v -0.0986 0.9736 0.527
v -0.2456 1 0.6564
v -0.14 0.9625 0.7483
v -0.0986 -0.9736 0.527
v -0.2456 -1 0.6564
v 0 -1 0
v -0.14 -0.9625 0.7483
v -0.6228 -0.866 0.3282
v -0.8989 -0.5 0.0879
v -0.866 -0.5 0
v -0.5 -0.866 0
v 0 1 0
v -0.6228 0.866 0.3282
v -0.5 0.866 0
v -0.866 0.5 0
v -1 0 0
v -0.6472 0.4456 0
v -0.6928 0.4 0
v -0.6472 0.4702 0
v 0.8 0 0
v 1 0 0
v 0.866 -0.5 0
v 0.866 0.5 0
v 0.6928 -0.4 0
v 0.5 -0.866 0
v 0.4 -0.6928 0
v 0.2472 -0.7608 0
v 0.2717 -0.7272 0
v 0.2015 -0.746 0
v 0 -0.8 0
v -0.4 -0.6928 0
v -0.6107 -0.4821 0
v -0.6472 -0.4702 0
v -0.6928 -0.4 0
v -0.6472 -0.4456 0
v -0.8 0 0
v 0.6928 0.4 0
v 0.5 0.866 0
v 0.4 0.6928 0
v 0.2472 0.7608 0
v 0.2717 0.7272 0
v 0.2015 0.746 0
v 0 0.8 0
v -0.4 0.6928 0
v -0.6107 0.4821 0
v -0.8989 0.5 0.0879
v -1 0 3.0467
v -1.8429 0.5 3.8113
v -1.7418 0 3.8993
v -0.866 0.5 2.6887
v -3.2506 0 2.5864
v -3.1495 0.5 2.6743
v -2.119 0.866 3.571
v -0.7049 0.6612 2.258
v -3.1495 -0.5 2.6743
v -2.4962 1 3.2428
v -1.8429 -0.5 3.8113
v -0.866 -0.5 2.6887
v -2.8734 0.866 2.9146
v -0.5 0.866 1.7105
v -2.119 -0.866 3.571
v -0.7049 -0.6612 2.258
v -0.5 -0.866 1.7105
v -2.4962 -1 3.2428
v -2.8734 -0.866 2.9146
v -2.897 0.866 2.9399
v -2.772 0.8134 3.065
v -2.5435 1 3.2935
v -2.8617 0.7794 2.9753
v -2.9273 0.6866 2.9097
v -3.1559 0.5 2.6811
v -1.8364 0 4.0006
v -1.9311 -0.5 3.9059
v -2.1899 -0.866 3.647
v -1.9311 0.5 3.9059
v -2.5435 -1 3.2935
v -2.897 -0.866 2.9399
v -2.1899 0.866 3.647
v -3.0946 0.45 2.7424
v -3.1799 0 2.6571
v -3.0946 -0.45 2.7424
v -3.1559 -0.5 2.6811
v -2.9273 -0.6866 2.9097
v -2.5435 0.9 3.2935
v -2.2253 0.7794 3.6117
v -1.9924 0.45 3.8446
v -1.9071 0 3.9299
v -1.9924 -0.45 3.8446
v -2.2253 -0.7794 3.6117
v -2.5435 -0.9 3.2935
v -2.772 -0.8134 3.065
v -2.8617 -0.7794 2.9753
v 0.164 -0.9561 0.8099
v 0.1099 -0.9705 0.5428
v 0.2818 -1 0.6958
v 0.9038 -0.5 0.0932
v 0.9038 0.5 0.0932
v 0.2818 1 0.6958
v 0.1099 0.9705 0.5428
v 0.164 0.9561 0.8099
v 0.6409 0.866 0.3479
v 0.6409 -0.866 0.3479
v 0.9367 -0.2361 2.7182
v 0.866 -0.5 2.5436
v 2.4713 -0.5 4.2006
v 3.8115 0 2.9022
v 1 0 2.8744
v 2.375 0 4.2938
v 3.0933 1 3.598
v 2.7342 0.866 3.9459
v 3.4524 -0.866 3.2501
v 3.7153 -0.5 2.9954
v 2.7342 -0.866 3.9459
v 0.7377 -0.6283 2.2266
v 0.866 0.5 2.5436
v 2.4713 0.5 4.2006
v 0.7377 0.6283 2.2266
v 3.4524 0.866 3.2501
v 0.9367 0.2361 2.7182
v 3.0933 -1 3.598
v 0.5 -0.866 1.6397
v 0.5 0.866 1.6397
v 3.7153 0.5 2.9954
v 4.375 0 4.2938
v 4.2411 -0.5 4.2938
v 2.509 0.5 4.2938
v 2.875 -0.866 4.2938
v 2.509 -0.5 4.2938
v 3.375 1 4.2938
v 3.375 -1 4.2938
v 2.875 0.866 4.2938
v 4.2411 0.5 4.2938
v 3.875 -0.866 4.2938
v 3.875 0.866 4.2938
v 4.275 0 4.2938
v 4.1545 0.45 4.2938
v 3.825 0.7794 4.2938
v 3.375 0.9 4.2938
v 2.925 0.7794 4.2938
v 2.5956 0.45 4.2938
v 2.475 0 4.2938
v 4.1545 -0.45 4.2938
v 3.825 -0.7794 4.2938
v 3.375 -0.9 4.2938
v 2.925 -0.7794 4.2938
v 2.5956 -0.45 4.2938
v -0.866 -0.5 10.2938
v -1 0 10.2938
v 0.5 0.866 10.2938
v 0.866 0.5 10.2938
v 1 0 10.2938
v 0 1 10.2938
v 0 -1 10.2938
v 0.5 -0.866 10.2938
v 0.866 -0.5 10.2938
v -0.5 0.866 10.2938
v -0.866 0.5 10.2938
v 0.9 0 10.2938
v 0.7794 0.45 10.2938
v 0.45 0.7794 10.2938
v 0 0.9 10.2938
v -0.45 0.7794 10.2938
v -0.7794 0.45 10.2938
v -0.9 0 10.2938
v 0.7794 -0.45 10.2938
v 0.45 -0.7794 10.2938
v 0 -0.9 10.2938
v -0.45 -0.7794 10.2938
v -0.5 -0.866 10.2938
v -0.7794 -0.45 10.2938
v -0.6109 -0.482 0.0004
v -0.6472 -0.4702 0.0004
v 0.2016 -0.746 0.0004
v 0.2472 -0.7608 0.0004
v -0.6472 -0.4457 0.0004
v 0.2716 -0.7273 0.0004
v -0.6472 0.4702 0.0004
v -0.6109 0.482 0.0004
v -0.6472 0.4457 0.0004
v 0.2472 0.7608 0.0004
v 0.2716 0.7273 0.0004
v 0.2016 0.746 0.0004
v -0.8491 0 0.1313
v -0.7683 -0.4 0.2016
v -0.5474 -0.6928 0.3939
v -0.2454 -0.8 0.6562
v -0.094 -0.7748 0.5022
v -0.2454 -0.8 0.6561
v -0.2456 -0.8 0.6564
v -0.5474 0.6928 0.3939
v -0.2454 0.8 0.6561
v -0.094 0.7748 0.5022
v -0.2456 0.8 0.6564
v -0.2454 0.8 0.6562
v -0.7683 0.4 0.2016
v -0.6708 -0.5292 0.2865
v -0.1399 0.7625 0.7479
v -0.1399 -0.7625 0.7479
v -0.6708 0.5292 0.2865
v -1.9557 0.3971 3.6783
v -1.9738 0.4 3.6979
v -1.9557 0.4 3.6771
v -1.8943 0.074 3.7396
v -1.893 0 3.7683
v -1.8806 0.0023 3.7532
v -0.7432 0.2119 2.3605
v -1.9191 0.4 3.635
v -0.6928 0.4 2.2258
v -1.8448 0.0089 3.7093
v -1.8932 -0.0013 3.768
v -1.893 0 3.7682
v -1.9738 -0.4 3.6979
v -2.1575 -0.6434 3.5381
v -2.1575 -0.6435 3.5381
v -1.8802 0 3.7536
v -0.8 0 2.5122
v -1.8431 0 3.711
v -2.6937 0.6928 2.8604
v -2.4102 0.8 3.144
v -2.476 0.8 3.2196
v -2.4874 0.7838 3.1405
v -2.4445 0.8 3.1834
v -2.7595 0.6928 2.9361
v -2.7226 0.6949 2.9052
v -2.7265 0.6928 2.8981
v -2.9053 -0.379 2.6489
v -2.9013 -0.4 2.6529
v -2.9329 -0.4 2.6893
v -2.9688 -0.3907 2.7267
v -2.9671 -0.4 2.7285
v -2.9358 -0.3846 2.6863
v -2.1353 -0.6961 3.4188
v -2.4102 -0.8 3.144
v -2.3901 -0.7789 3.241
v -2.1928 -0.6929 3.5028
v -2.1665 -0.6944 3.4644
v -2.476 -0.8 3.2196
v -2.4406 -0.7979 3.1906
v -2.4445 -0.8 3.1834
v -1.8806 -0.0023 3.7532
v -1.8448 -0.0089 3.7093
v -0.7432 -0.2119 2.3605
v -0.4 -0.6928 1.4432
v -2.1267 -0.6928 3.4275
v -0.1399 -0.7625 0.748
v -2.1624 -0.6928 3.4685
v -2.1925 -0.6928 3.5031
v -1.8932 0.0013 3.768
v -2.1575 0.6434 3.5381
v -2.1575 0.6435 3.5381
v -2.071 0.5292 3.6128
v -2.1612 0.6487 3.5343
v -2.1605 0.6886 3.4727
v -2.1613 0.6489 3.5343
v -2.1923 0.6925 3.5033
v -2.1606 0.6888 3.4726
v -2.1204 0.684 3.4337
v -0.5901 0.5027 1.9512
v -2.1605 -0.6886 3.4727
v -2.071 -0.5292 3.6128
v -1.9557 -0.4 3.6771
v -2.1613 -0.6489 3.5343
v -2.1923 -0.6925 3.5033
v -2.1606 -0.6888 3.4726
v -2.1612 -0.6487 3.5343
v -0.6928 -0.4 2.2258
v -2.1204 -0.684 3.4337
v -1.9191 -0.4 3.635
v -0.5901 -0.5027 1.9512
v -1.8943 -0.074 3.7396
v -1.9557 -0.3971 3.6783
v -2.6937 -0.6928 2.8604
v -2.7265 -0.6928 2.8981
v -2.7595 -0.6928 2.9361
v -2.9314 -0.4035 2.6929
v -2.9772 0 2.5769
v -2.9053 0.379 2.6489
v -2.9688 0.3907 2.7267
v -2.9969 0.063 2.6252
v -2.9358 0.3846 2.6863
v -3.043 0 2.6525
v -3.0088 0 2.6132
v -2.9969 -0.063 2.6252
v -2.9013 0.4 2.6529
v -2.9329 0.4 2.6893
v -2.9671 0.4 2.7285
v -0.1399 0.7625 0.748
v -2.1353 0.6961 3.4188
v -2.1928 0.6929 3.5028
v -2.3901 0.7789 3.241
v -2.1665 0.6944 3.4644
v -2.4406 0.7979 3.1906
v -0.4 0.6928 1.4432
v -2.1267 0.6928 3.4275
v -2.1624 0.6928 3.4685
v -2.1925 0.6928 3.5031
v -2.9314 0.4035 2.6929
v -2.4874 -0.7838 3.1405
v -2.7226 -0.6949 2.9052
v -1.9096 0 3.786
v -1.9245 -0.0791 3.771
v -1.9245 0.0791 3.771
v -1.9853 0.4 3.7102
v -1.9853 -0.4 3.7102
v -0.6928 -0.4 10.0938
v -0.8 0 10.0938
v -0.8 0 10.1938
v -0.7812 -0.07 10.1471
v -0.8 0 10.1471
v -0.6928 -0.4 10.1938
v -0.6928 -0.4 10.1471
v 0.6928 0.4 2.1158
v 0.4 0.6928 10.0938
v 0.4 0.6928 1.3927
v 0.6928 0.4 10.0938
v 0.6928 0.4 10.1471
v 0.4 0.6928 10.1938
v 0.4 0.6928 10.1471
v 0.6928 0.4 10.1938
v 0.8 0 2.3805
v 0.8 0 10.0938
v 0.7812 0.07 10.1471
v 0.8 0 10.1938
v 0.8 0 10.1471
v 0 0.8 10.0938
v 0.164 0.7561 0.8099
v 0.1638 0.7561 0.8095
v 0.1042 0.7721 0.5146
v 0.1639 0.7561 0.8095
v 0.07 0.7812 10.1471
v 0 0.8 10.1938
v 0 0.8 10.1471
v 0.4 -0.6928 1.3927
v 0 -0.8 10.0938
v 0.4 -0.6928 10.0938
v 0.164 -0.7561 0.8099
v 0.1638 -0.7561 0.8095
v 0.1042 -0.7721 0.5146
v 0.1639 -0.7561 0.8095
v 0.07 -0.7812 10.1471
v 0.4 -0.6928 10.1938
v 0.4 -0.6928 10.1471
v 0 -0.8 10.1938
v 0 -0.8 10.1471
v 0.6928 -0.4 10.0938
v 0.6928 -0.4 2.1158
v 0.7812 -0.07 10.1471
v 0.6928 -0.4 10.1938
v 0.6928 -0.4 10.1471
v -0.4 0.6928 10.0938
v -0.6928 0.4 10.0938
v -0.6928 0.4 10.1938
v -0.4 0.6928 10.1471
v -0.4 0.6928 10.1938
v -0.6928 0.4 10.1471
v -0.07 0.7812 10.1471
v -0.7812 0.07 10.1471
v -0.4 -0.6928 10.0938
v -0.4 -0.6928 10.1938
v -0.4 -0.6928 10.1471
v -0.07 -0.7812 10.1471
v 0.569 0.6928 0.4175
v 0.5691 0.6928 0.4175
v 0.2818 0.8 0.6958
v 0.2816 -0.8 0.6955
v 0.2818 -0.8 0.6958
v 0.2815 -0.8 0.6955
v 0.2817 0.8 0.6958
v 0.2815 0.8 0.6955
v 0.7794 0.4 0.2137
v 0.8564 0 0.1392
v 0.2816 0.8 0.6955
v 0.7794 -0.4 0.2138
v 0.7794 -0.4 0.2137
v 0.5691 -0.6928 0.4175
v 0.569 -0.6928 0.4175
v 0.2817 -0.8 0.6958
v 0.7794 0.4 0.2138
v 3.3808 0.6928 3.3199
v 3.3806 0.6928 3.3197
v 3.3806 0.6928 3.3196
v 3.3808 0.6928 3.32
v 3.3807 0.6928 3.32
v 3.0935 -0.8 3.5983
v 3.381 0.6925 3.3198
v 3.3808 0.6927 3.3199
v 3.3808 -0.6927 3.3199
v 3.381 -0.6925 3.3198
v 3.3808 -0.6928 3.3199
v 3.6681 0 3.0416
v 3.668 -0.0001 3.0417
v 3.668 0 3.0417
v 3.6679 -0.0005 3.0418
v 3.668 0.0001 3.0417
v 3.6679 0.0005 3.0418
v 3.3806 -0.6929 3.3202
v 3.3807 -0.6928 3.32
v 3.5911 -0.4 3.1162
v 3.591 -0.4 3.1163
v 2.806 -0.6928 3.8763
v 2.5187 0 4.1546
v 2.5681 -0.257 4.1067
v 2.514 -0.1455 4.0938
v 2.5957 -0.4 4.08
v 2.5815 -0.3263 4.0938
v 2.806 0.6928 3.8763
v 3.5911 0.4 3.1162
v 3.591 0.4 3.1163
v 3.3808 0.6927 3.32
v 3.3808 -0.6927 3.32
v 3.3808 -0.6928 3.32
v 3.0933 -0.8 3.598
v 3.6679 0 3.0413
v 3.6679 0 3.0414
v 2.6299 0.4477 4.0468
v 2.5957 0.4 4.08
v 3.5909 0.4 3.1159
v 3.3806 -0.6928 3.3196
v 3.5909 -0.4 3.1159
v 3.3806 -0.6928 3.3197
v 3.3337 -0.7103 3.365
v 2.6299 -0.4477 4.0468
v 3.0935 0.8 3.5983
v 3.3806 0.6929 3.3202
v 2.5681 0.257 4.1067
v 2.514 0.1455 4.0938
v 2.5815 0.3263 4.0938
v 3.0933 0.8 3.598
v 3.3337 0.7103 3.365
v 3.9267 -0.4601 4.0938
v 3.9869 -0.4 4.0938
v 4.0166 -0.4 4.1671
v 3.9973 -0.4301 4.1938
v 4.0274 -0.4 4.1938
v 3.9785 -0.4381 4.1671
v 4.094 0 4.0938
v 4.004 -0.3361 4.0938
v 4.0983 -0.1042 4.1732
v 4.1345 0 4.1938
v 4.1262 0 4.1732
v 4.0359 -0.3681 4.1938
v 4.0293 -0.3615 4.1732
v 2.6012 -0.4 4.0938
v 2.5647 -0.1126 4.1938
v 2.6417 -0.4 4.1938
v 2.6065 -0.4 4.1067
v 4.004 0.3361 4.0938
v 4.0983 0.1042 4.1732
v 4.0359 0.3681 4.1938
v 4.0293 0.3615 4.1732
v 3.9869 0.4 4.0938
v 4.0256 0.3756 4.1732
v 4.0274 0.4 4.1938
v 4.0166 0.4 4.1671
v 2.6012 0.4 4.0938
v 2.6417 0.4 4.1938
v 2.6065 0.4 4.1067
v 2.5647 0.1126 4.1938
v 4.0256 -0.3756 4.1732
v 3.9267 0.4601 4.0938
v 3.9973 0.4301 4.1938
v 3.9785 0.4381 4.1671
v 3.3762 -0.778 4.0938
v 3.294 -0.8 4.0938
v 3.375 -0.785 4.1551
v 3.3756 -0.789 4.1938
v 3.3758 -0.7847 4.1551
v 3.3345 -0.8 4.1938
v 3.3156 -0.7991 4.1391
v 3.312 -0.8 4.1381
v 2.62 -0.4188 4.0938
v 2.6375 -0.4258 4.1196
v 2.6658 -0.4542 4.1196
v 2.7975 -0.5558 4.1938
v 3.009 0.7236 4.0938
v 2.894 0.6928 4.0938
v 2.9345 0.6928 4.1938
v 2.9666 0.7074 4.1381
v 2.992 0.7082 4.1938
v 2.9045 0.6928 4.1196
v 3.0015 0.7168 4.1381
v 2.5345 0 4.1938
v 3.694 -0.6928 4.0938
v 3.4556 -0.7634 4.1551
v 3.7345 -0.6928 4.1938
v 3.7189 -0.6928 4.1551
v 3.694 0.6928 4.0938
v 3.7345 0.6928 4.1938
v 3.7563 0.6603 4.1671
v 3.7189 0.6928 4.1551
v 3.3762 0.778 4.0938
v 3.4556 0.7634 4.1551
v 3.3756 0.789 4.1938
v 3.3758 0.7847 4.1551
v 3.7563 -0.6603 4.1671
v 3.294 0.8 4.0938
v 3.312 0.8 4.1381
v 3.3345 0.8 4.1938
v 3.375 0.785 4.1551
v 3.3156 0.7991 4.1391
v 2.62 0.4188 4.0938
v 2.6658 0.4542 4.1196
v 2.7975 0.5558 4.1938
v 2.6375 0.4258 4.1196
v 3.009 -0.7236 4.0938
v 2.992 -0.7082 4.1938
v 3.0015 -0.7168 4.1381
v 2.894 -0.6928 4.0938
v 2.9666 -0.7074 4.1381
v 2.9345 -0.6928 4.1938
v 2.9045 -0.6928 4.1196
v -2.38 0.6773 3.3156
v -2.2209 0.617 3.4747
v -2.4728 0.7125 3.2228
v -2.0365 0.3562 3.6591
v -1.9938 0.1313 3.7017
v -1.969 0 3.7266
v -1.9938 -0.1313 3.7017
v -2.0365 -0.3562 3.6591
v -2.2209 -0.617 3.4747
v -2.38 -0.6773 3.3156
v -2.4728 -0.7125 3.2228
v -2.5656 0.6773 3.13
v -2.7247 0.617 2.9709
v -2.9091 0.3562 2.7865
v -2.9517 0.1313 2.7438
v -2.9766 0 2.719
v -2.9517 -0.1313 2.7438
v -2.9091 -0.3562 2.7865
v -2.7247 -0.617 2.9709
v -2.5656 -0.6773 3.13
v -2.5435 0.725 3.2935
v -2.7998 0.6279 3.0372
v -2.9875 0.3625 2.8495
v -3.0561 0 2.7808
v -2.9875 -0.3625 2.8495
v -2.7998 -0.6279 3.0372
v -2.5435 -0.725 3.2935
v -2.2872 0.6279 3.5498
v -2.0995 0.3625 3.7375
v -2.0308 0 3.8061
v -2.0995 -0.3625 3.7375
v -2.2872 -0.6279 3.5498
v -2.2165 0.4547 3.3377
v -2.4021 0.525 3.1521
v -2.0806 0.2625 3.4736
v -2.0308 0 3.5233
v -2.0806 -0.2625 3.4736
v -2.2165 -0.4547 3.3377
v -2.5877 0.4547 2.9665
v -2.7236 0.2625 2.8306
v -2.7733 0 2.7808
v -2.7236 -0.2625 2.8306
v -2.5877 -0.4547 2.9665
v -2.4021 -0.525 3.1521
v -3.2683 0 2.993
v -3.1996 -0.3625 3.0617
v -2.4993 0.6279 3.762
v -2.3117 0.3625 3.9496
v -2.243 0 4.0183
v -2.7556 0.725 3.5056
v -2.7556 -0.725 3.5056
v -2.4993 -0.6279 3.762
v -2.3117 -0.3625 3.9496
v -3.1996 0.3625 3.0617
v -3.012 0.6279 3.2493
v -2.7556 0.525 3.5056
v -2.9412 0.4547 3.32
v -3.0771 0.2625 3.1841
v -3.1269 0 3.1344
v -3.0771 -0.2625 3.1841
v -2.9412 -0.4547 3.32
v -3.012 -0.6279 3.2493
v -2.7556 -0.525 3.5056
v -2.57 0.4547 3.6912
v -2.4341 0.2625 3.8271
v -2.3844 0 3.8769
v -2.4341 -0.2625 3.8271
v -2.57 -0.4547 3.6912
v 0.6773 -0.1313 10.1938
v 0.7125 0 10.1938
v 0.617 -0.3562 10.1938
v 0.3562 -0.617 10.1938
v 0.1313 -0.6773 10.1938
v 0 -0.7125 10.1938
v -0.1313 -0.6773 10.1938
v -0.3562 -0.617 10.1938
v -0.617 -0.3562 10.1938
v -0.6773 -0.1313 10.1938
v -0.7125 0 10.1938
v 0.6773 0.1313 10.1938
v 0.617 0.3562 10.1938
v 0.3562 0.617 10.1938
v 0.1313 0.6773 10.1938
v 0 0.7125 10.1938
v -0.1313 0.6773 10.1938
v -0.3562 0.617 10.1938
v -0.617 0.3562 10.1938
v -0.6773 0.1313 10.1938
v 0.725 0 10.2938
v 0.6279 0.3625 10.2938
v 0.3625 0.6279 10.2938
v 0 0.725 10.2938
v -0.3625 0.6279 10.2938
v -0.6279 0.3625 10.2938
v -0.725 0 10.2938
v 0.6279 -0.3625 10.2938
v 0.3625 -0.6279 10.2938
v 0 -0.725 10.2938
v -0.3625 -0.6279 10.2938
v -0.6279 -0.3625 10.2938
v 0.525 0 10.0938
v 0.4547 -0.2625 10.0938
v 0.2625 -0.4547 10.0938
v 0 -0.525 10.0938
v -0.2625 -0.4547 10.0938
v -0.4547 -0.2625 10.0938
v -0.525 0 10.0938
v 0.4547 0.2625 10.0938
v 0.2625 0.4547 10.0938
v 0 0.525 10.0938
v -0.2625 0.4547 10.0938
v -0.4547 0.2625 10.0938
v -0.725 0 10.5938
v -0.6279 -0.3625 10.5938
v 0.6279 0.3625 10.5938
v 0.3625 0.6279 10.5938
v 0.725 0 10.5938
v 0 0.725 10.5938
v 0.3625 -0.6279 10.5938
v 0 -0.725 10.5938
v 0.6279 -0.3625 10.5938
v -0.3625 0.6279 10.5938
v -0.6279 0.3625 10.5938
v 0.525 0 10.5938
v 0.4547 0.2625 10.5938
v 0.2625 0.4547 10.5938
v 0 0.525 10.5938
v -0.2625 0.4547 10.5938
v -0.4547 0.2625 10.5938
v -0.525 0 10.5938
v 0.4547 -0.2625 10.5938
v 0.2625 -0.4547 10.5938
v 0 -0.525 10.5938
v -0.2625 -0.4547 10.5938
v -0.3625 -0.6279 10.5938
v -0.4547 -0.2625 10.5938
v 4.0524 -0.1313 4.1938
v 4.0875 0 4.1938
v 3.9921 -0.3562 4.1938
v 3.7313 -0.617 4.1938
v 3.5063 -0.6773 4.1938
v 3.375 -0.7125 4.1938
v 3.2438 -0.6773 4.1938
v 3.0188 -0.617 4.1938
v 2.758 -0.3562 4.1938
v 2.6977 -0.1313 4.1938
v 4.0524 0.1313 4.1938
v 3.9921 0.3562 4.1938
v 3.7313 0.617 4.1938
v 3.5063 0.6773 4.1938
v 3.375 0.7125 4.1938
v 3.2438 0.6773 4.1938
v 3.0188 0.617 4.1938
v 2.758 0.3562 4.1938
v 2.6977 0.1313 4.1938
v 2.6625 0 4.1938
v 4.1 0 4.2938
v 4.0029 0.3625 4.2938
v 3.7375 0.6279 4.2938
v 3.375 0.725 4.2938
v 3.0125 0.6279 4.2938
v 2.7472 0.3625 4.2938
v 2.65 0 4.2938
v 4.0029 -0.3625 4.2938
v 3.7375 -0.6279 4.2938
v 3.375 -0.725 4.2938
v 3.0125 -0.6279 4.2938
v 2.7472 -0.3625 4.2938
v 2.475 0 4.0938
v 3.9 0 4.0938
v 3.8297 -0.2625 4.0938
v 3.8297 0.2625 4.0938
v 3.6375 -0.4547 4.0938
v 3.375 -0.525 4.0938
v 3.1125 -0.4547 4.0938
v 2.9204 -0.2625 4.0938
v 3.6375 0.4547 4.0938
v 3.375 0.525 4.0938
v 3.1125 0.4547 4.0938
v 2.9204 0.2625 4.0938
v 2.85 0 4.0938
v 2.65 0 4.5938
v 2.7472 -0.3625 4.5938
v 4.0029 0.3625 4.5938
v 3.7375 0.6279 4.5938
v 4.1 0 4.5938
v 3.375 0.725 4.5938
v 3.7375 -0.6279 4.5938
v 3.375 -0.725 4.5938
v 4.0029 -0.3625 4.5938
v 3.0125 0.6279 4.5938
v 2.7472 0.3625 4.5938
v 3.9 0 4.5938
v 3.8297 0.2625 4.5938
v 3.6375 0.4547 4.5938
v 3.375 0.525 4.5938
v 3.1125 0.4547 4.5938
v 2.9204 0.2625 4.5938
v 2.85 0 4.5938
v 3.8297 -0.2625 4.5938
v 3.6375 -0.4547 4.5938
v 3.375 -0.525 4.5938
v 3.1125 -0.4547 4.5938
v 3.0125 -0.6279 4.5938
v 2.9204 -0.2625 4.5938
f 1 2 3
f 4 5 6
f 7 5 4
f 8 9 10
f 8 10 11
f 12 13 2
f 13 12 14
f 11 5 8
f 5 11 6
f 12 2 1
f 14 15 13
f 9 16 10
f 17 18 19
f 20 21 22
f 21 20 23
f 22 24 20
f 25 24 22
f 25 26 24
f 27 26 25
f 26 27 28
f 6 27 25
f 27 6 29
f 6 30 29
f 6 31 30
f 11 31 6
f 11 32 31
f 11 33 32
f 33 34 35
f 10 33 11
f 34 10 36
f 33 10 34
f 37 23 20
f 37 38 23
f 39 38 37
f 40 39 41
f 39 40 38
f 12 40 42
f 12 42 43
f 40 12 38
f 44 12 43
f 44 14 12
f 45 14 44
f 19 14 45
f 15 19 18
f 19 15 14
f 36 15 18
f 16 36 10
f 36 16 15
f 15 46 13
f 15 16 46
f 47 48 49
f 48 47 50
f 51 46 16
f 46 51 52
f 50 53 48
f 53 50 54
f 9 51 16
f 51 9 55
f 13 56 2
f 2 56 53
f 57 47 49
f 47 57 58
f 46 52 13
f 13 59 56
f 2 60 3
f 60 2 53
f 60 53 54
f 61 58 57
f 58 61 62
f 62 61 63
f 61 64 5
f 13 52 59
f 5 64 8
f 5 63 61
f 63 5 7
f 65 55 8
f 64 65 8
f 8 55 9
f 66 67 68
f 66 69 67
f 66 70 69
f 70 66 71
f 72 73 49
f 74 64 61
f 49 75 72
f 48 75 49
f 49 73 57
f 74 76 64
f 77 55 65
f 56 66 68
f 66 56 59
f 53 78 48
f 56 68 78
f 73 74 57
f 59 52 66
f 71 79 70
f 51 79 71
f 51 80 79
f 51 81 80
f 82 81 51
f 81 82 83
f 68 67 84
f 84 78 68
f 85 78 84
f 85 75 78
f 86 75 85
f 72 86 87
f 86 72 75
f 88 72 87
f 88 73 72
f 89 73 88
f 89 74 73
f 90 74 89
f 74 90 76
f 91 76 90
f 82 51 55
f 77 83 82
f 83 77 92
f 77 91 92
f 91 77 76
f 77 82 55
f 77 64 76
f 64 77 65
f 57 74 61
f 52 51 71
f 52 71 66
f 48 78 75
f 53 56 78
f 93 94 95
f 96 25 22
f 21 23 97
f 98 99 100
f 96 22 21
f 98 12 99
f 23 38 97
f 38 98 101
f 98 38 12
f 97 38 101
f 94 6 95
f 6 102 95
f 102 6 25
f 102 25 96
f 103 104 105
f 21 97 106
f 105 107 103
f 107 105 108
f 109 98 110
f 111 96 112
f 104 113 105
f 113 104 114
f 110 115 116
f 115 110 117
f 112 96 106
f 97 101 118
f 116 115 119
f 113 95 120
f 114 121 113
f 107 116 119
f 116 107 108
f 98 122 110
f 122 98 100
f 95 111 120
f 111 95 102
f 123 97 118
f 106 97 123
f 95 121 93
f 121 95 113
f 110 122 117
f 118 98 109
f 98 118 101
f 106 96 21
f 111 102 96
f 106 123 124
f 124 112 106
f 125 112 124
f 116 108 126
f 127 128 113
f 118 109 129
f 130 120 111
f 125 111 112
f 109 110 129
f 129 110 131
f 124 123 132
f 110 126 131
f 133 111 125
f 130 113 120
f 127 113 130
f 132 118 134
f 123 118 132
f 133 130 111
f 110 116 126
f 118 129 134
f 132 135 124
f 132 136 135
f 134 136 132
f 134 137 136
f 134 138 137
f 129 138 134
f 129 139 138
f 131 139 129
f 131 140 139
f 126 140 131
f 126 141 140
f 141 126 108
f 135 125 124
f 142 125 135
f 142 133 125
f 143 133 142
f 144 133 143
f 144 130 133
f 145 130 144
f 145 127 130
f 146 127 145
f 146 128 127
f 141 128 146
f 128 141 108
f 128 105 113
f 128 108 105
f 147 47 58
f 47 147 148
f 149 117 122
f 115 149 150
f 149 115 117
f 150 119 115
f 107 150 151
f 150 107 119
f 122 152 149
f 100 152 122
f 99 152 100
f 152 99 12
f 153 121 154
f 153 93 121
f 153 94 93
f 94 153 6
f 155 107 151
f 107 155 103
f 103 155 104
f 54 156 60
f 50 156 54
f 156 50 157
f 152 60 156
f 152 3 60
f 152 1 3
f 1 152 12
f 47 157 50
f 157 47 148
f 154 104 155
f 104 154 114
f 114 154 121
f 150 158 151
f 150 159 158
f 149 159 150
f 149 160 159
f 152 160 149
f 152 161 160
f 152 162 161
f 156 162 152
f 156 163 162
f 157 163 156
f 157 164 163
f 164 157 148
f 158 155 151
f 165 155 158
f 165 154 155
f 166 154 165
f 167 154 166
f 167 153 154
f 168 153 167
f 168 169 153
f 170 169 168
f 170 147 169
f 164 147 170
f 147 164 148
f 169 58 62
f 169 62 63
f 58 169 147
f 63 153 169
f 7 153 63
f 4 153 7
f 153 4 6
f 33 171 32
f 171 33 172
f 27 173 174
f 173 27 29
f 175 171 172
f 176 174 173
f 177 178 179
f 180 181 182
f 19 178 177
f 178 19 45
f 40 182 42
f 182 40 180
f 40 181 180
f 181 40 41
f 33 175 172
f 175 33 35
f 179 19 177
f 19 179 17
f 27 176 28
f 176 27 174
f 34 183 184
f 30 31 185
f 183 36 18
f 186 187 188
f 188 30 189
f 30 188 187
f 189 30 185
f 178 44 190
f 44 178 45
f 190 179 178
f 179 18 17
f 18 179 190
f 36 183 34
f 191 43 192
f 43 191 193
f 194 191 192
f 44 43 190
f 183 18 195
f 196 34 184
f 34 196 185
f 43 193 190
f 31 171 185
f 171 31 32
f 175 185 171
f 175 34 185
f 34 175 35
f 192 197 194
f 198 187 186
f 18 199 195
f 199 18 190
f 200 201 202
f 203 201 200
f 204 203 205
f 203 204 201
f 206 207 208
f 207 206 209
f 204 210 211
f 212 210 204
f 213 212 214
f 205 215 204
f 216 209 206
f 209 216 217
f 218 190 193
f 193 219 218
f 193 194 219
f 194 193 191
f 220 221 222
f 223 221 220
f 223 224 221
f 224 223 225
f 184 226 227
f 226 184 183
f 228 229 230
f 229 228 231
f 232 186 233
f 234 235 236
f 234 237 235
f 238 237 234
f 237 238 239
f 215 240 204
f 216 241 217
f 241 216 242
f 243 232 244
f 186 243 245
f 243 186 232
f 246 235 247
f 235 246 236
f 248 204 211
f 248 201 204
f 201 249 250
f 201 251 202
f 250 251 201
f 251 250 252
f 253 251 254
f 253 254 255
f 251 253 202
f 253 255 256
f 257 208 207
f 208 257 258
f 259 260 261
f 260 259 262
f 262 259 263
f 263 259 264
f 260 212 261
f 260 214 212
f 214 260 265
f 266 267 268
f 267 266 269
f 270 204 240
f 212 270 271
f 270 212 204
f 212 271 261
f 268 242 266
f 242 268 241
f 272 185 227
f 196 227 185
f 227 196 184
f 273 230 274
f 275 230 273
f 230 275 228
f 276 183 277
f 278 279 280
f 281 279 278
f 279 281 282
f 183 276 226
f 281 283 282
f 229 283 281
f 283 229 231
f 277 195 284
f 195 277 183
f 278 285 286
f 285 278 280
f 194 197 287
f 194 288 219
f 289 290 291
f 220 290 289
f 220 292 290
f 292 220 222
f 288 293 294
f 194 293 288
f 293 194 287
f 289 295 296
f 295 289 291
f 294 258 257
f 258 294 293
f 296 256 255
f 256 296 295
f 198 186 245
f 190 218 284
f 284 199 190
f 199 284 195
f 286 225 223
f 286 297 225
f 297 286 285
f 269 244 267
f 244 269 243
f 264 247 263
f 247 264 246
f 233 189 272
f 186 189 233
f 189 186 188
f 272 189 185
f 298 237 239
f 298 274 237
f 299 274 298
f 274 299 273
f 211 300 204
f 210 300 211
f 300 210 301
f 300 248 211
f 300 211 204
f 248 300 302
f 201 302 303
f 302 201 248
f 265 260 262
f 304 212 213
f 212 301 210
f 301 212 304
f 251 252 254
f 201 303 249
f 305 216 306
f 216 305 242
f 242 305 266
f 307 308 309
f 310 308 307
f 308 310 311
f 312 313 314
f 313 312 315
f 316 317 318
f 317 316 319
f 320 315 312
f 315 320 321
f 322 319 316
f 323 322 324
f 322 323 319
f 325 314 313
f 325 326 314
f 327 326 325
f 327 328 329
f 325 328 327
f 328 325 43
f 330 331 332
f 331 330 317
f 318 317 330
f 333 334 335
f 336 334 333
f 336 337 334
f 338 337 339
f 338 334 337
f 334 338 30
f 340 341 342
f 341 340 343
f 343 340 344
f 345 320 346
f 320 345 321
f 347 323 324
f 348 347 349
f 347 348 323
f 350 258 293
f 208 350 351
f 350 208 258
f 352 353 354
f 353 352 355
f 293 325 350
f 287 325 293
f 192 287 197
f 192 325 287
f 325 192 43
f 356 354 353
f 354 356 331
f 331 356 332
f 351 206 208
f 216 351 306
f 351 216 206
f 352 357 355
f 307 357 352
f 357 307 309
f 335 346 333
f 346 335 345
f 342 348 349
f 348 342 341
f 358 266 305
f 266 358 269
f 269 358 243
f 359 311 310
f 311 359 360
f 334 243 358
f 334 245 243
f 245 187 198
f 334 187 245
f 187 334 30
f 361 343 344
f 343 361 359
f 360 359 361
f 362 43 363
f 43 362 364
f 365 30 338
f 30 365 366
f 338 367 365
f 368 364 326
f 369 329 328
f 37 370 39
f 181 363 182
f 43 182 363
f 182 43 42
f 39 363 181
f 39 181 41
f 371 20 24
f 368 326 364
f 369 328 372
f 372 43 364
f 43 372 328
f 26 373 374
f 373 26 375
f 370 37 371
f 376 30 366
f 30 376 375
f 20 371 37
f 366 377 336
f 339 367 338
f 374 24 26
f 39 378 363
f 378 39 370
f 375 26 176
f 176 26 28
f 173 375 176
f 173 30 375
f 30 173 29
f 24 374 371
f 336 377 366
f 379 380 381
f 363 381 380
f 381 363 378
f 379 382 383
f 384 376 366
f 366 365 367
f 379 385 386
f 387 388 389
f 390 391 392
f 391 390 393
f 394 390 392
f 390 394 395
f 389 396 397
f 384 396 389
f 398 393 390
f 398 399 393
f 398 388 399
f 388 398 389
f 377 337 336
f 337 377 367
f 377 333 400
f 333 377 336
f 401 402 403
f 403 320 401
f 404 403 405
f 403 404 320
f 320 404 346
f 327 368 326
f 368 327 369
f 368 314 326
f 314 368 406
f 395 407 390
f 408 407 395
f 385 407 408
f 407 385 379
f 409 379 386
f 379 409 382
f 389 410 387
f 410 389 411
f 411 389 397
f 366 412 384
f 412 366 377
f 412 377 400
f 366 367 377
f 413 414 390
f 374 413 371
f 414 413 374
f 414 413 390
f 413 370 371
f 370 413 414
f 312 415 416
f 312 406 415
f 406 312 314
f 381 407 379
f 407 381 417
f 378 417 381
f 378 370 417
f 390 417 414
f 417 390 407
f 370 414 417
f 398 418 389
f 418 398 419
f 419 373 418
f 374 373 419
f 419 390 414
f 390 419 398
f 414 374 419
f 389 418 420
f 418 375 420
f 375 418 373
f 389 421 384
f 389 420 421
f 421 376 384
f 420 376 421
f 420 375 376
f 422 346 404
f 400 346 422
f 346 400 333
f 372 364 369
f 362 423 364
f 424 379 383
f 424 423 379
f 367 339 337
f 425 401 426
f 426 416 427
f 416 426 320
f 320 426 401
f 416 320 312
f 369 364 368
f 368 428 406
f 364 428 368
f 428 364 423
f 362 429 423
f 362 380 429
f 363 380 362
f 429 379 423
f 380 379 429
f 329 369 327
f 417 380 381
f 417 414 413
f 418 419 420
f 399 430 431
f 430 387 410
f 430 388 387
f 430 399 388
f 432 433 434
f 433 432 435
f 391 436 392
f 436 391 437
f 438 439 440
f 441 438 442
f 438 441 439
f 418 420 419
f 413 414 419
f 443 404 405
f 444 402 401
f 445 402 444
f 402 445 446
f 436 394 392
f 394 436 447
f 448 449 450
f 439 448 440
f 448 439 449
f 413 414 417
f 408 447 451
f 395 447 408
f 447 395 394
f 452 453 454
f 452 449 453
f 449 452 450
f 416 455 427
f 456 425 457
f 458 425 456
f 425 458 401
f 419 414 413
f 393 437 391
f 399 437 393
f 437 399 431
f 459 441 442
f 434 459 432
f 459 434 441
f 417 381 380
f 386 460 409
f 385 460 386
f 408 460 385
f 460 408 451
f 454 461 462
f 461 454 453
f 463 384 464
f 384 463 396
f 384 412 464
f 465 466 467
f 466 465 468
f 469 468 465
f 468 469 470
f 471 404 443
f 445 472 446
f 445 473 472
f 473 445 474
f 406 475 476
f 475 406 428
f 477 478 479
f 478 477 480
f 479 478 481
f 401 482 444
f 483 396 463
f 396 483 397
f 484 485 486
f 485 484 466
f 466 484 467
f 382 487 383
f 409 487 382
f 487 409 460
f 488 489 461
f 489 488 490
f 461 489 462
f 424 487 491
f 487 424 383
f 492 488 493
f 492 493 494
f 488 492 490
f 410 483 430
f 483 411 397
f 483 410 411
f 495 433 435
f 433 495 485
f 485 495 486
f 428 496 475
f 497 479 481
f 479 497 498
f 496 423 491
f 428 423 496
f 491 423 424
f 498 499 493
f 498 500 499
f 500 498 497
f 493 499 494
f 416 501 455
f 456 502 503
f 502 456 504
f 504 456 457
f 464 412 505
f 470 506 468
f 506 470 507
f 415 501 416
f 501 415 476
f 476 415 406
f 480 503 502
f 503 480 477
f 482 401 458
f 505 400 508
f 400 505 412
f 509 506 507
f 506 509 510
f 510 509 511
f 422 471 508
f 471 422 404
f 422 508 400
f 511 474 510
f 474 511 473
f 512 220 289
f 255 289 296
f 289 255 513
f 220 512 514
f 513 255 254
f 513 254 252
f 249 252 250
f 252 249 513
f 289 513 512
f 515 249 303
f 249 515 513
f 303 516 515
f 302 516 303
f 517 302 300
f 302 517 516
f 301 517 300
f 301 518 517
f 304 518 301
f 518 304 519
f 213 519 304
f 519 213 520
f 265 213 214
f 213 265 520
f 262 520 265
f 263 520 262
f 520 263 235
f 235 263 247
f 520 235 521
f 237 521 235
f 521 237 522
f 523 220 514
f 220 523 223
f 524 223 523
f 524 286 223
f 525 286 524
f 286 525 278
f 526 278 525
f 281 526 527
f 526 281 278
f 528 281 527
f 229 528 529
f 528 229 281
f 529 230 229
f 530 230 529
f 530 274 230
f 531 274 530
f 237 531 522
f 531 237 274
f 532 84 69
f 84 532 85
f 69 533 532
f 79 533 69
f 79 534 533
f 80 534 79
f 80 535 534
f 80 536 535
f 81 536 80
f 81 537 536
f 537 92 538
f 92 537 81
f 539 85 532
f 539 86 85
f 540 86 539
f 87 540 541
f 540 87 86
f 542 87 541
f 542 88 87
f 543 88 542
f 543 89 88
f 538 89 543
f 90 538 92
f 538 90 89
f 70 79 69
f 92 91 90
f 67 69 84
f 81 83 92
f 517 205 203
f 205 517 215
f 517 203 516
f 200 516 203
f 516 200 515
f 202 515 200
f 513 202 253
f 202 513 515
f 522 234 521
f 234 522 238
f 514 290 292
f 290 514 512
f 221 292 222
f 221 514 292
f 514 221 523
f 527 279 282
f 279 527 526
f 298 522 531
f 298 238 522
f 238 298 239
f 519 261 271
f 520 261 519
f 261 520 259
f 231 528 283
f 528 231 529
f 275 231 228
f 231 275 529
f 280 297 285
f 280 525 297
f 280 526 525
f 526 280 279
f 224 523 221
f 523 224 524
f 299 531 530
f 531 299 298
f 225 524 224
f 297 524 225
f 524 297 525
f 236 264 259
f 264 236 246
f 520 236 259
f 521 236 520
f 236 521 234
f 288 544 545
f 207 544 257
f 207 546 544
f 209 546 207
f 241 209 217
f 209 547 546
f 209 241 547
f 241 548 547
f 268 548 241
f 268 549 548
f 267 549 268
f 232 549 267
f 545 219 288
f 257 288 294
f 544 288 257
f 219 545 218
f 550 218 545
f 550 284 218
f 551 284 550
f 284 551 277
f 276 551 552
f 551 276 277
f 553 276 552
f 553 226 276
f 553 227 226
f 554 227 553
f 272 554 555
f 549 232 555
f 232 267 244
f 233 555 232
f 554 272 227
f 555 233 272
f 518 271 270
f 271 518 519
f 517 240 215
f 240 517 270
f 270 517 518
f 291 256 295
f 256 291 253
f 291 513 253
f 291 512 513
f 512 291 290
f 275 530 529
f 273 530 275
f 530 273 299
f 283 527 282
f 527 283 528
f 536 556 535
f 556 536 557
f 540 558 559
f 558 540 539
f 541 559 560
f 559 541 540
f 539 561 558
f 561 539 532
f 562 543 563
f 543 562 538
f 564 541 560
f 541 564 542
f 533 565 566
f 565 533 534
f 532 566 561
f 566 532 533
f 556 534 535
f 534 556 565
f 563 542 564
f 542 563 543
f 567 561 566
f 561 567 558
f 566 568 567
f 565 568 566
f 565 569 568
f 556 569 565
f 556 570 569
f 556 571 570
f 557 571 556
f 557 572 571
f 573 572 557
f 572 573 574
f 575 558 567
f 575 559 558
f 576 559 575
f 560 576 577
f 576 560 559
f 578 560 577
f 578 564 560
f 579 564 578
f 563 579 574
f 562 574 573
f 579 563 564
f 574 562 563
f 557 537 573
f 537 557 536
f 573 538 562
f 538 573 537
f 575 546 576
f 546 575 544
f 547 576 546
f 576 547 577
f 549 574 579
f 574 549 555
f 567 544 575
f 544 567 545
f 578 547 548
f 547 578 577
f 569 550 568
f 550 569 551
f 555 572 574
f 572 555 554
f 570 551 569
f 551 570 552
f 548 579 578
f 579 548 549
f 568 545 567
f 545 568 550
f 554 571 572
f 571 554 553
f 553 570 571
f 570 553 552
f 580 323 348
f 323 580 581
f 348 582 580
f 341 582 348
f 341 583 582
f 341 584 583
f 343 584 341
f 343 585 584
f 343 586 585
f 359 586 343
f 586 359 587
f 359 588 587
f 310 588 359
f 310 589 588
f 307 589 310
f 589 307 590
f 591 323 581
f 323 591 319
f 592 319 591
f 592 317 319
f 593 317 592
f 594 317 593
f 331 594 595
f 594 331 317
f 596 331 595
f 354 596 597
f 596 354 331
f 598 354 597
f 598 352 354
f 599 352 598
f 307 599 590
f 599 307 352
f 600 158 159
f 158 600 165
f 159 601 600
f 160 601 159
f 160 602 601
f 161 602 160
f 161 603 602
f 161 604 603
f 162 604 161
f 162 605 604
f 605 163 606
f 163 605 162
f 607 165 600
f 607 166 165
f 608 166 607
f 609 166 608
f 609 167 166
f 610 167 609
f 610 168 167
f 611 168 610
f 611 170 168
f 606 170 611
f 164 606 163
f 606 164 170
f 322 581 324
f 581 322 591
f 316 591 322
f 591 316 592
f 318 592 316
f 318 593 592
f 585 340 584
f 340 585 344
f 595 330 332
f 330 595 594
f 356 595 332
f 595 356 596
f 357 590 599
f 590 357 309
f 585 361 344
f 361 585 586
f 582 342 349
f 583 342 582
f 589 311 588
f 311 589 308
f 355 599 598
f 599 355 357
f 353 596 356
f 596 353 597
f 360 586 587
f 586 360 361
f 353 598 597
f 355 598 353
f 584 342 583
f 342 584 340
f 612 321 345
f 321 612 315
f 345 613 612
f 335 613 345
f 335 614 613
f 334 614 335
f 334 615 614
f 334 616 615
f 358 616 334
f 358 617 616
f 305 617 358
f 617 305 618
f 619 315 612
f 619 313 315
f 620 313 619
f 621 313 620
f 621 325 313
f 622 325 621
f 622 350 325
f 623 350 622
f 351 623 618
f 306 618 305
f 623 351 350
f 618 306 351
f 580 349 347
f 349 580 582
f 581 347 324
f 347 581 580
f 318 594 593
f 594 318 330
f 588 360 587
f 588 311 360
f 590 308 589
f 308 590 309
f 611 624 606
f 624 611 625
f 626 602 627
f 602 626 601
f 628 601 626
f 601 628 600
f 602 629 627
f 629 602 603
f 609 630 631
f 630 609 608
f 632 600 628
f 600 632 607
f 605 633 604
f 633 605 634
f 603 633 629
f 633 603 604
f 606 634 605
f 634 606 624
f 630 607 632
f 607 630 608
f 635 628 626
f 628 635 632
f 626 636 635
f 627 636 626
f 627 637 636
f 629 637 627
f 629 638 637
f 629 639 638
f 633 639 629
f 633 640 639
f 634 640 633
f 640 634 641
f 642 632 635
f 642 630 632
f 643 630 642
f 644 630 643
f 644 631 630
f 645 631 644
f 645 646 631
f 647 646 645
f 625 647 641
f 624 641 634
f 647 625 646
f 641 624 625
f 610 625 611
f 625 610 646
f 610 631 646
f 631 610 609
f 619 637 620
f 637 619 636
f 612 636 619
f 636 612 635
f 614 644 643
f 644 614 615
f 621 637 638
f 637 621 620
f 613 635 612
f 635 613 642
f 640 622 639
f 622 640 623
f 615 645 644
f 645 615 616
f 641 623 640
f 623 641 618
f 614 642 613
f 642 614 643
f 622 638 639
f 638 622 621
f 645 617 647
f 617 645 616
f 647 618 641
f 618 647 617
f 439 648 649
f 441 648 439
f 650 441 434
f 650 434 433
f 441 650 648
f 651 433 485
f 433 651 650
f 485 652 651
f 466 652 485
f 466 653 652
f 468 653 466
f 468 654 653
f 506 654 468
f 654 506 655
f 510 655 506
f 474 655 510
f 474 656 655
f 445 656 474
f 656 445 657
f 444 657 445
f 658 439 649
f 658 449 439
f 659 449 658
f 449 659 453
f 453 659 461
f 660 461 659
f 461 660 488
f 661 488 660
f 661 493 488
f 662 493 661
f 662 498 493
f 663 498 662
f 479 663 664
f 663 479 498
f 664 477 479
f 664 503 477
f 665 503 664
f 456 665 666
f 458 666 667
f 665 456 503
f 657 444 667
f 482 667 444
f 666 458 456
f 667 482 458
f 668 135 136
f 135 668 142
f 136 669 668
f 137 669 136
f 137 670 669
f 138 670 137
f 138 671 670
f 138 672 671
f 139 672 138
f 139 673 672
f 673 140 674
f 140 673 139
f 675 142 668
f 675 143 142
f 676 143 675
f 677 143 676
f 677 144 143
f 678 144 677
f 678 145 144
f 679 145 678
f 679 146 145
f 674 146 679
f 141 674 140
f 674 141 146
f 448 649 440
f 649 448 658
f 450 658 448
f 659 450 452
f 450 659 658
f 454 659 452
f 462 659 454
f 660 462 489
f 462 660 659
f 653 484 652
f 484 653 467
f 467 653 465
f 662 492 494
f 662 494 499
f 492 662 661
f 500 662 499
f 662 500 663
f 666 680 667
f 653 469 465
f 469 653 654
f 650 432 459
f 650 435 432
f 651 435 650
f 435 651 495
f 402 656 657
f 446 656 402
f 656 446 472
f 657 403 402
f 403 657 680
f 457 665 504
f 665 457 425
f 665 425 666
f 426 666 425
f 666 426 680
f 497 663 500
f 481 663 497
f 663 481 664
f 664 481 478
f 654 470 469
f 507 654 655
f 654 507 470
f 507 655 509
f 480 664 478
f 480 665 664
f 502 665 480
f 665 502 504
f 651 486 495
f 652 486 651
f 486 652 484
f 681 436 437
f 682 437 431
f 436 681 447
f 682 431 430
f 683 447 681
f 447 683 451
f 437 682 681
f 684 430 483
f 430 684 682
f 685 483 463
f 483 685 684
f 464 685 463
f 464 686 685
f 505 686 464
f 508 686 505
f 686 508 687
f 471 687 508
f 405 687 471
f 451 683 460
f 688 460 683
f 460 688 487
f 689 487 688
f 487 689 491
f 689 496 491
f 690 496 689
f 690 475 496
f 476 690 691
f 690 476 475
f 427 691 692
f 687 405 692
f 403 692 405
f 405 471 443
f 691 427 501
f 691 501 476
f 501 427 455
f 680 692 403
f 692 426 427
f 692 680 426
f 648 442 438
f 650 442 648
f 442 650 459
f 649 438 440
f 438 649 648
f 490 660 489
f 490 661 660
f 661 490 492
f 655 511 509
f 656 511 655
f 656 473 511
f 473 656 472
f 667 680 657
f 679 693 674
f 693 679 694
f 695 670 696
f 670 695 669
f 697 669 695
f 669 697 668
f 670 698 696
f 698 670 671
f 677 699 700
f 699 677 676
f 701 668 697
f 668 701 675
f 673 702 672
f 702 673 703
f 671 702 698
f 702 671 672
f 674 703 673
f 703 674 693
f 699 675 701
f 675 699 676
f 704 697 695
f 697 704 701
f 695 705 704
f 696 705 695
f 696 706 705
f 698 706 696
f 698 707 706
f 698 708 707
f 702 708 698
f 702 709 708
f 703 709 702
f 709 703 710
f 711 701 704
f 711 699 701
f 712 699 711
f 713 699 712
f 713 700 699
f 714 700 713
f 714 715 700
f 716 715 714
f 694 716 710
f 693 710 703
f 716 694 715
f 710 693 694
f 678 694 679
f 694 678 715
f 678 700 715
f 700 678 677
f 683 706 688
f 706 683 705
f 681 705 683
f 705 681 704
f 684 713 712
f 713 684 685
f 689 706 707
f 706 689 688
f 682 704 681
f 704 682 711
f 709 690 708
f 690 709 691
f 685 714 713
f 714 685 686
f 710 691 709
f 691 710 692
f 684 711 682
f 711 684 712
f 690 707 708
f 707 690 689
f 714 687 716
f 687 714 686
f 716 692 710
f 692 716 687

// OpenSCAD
tolerance=0.075;
hole_radius=0.075;
grid_hole_radius=0.075;
outer_radius=1;
thickness=0.2;
hole_attach_height=0.075;
attach_thickness=0.1;

//parameters that don't have to be defined explicitly
eps = tolerance/100;
inner_radius = outer_radius - thickness;
fn = 12;
fnh = 6;

module angled_cylinder(angle_deg_y, _h, _r, angle_deg_x = 0) {
    rotate([angle_deg_x, angle_deg_y, 0]) { // Rotate the cylinder 
            cylinder(h = _h, r = _r, center = true, $fn = fnh);
        }
}

module hole(_h) {
    cylinder(h = _h, r = grid_hole_radius, $fn = fnh);
}

//makes circle of holes
module circular_grid(_h, _r, _n) {
    for (i = [0:_n-1]) {
        angle = i * 360 / _n;
        x_pos = _r * cos(angle);
        y_pos = _r * sin(angle);
        translate([x_pos, y_pos, -eps]) {
            hole(_h);
        }
    }
}

//makes grid of holes
module hole_grid(hole_height, grid_h) {
    translate([0,0,hole_height]) {
        difference() {
            //cylinder
            cylinder(h = grid_h, r = (inner_radius + outer_radius)/2, 
                center=false, $fn = fn);
            //holes
            for (i = [0 : grid_hole_radius * 2 + hole_attach_height : inner_radius - grid_hole_radius * 2]) {
                circular_grid(grid_h + eps*2, i, ceil(6.28*i/(grid_hole_radius*4)));
            }
            
        } 
    }
}

//makes curve of CSC
module curve(_radius, _twist, _turning_angle, _turning_radius) {
    rotate([90,0,_twist])
    translate([-_turning_radius, 0, 0])
    rotate_extrude(angle=_turning_angle, convexity=100, $fn = fn)
    translate([_turning_radius, 0]) circle(_radius);
}

module CSC(_r, _t1, _ta1, _tr1, _h, _t2, _ta2, _tr2, is_inner) {
    
    if (_ta1 > 90) {
        CSC(_r, _t1, 90, _tr1, 0, 0, 0, 0, is_inner);
        
        pos1 = (-_tr1 + sqrt(_tr1*_tr1 - pow(_tr1,2)));
        translate([pos1*cos(_t1),pos1*sin(_t1),_tr1])
        rotate([0,-90,_t1])
        CSC(_r, 0, _ta1 - 90, _tr1, _h, _t2, _ta2, _tr2, is_inner);
    } else if (_ta2 > 90) {
        CSC(_r, _t1, _ta1, _tr1, _h, _t2, 90, _tr2, is_inner);
        
        pos1 = (-_tr1 + sqrt(_tr1*_tr1 - pow(_tr1*sin(_ta1),2)));
        pos2 = (-_tr2 + sqrt(_tr2*_tr2 - pow(_tr2,2)));
        translate([pos1*cos(_t1),pos1*sin(_t1),_tr1*sin(_ta1)])
        rotate([0,-_ta1,_t1])
        translate([0, 0, _h])
        translate([pos2*cos(_t2),pos2*sin(_t2),_tr2])
        rotate([0,-90,_t2])
        CSC(_r, 0, 0, 0, 0, 0, _ta2 - 90, _tr2, is_inner);
    } else {
        //intermediate positions
        pos1 = (-_tr1 + sqrt(_tr1*_tr1 - pow(_tr1*sin(_ta1),2)));
        pos2 = (-_tr2 + sqrt(_tr2*_tr2 - pow(_tr2*sin(_ta2),2)));
        
        union() {
            //bottom shell threshold
            if (is_inner) {
                cylinder(h=eps, r=_r, center=true);
            }
            
            //first curve of CSC
            curve(_r, _t1, _ta1, _tr1);
            
            //straight link of CSC
            translate([pos1*cos(_t1),pos1*sin(_t1),_tr1*sin(_ta1)])
            rotate([0,-_ta1,_t1])
            if (is_inner) {
                //add threshold for shelling
                translate([0,0,-eps /2])
                cylinder(h=_h + eps,r=_r, center = false, $fn= fn);
            } else {
                cylinder(h=_h,r=_r, center = false, $fn= fn);
            }
            
            //second curve of CSC
            translate([pos1*cos(_t1),pos1*sin(_t1),_tr1*sin(_ta1)])
            rotate([0,-_ta1,_t1])
            translate([0, 0, _h])
            curve(_r, _t2, _ta2, _tr2);
            
            //shelling thresholds
            if (is_inner) {
                translate([pos1*cos(_t1),pos1*sin(_t1),_tr1*sin(_ta1)])
                rotate([0,-_ta1,_t1])
                translate([0, 0, _h])
                translate([pos2*cos(_t2),pos2*sin(_t2),_tr2*sin(_ta2)])
                rotate([0,-_ta2,_t2]) {
                    cylinder(h=eps, r=_r, center=true,$fn=fn);
                }
            
            }
        }
    }
    
}

//allow modules to attach
module CSC_ATTACH(_r, _t1, _ta1, _tr1, _h, _t2, _ta2, _tr2, next_hole_radius, next_hole_attach_height, next_inner) {
    
    if (_ta1 > 90) {        
        pos1 = (-_tr1 + sqrt(_tr1*_tr1 - pow(_tr1,2)));
        translate([pos1*cos(_t1),pos1*sin(_t1),_tr1])
        rotate([0,-90,_t1])
        CSC_ATTACH(_r, 0, _ta1 - 90, _tr1, _h, _t2, _ta2, _tr2, next_hole_radius, next_hole_attach_height, next_inner);
    } else if (_ta2 > 90) {        
        pos1 = (-_tr1 + sqrt(_tr1*_tr1 - pow(_tr1*sin(_ta1),2)));
        pos2 = (-_tr2 + sqrt(_tr2*_tr2 - pow(_tr2,2)));
        translate([pos1*cos(_t1),pos1*sin(_t1),_tr1*sin(_ta1)])
        rotate([0,-_ta1,_t1])
        translate([0, 0, _h])
        translate([pos2*cos(_t2),pos2*sin(_t2),_tr2])
        rotate([0,-90,_t2])
        CSC_ATTACH(_r, 0, 0, 0, 0, 0, _ta2 - 90, _tr2, next_hole_radius, next_hole_attach_height, next_inner);
    } else {
        //intermediate positions
        pos1 = (-_tr1 + sqrt(_tr1*_tr1 - pow(_tr1*sin(_ta1),2)));
        pos2 = (-_tr2 + sqrt(_tr2*_tr2 - pow(_tr2*sin(_ta2),2)));
        
        translate([pos1*cos(_t1),pos1*sin(_t1),_tr1*sin(_ta1)])
        rotate([0,-_ta1,_t1])
        translate([0, 0, _h])
        translate([pos2*cos(_t2),pos2*sin(_t2),_tr2*sin(_ta2)])
        rotate([0,-_ta2,_t2]) {
            difference() {
                union() {
                    //attachment for smaller cylinder
                    translate([0,0,-attach_thickness])
                    cylinder(h=attach_thickness, r=_r - thickness/2, $fn=fn);
                    translate([0,0,-attach_thickness*2])
                    cylinder(h=attach_thickness*2, r1=_r - thickness/2, r2=next_inner - tolerance - thickness, $fn=fn);
                    
                    //small cylinder
                    cylinder(h=next_hole_radius*2 + next_hole_attach_height * 2, r = next_inner - tolerance, $fn=fn);
                }
                
                //shelling
                translate([0,0, -attach_thickness*2 - eps/2])
                cylinder(h=next_hole_radius*2 + next_hole_attach_height * 2 + attach_thickness*2 + eps, r = min(inner_radius, next_inner - tolerance - thickness), $fn=fn);
                
                //holes for screws
    //            translate([0,0,next_hole_attach_height + next_hole_radius]) {
    //                angled_cylinder(0, (next_inner + thickness + eps) * 2,  hole_radius, 90);
    //                angled_cylinder(90, (next_inner + thickness + eps) * 2, hole_radius, 0);
    //            }
            }
        }
    }
}

//remove overlap to allow all branches to attach to each other
module CSC_REMOVE_OVERLAP(_r, _t1, _ta1, _tr1, _h, _t2, _ta2, _tr2, next_hole_radius, next_hole_attach_height, next_inner) {
    if (_ta1 > 90) {        
        pos1 = (-_tr1 + sqrt(_tr1*_tr1 - pow(_tr1,2)));
        translate([pos1*cos(_t1),pos1*sin(_t1),_tr1])
        rotate([0,-90,_t1])
        CSC_REMOVE_OVERLAP(_r, 0, _ta1 - 90, _tr1, _h, _t2, _ta2, _tr2, next_hole_radius, next_hole_attach_height, next_inner);
    } else if (_ta2 > 90) {        
        pos1 = (-_tr1 + sqrt(_tr1*_tr1 - pow(_tr1*sin(_ta1),2)));
        pos2 = (-_tr2 + sqrt(_tr2*_tr2 - pow(_tr2,2)));
        translate([pos1*cos(_t1),pos1*sin(_t1),_tr1*sin(_ta1)])
        rotate([0,-_ta1,_t1])
        translate([0, 0, _h])
        translate([pos2*cos(_t2),pos2*sin(_t2),_tr2])
        rotate([0,-90,_t2])
        CSC_REMOVE_OVERLAP(_r, 0, 0, 0, 0, 0, _ta2 - 90, _tr2, next_hole_radius, next_hole_attach_height, next_inner);
    } else {
        pos1 = (-_tr1 + sqrt(_tr1*_tr1 - pow(_tr1*sin(_ta1),2)));
        pos2 = (-_tr2 + sqrt(_tr2*_tr2 - pow(_tr2*sin(_ta2),2)));
        
        translate([pos1*cos(_t1),pos1*sin(_t1),_tr1*sin(_ta1)])
        rotate([0,-_ta1,_t1])
        translate([0, 0, _h])
        translate([pos2*cos(_t2),pos2*sin(_t2),_tr2*sin(_ta2)])
        rotate([0,-_ta2,_t2]) {
            cylinder(h=999999, r=_r + tolerance, $fn=fn);
        }
    }
}

//c is _t1, _ta1, _tr1, _h, _t2, _ta2, _tr2, next hole radius, next hole height, next inner radius
module branch(branch_list, _outer, _inner) {
    union() {
        //make grid of holes
        //hole_grid(hole_radius*2 + hole_attach_height * 2, grid_hole_radius);
        
        //make CSC shells for each CSC in branch_list
        difference() {
            for (c = branch_list) {
                CSC(_outer,c[0],c[1],c[2],c[3],c[4],c[5],c[6], false);
            }
            
            for (c = branch_list) {
                CSC(_inner,c[0],c[1],c[2],c[3],c[4],c[5],c[6], true);
                CSC_REMOVE_OVERLAP(_outer,c[0],c[1],c[2],c[3],c[4],c[5],c[6],c[7], c[8], c[9]);
            }
            
            //make screw holes at the bottom
//            translate([0,0,hole_radius + hole_attach_height]) {
//                angled_cylinder(0, (outer_radius*1.5 + eps) * 2,  hole_radius, 90);
//                angled_cylinder(90, (outer_radius*1.5 + eps) * 2, hole_radius, 0);
//            }    
        }
        for (c=branch_list) {     
            CSC_ATTACH(_outer,c[0],c[1],c[2],c[3],c[4],c[5],c[6], c[7], c[8], c[9]);
        }
    }
}

branch([
[ 0.0, 41.0289, 1.0*outer_radius, 3.4285*outer_radius, -0.0, 3.9711, 1.0*outer_radius, 0.075, 0.075, 0.8],
[ 0.0, 0.0, 1.0*outer_radius, 10.2938*outer_radius, 0.0, 0.0, 1.0*outer_radius, 0.075, 0.075, 0.8],
[ -180.0, 44.0908, 1.0*outer_radius, 4.0407*outer_radius, 180.0, 44.0908, 1.0*outer_radius, 0.075, 0.075, 0.8],
],outer_radius,inner_radius);
